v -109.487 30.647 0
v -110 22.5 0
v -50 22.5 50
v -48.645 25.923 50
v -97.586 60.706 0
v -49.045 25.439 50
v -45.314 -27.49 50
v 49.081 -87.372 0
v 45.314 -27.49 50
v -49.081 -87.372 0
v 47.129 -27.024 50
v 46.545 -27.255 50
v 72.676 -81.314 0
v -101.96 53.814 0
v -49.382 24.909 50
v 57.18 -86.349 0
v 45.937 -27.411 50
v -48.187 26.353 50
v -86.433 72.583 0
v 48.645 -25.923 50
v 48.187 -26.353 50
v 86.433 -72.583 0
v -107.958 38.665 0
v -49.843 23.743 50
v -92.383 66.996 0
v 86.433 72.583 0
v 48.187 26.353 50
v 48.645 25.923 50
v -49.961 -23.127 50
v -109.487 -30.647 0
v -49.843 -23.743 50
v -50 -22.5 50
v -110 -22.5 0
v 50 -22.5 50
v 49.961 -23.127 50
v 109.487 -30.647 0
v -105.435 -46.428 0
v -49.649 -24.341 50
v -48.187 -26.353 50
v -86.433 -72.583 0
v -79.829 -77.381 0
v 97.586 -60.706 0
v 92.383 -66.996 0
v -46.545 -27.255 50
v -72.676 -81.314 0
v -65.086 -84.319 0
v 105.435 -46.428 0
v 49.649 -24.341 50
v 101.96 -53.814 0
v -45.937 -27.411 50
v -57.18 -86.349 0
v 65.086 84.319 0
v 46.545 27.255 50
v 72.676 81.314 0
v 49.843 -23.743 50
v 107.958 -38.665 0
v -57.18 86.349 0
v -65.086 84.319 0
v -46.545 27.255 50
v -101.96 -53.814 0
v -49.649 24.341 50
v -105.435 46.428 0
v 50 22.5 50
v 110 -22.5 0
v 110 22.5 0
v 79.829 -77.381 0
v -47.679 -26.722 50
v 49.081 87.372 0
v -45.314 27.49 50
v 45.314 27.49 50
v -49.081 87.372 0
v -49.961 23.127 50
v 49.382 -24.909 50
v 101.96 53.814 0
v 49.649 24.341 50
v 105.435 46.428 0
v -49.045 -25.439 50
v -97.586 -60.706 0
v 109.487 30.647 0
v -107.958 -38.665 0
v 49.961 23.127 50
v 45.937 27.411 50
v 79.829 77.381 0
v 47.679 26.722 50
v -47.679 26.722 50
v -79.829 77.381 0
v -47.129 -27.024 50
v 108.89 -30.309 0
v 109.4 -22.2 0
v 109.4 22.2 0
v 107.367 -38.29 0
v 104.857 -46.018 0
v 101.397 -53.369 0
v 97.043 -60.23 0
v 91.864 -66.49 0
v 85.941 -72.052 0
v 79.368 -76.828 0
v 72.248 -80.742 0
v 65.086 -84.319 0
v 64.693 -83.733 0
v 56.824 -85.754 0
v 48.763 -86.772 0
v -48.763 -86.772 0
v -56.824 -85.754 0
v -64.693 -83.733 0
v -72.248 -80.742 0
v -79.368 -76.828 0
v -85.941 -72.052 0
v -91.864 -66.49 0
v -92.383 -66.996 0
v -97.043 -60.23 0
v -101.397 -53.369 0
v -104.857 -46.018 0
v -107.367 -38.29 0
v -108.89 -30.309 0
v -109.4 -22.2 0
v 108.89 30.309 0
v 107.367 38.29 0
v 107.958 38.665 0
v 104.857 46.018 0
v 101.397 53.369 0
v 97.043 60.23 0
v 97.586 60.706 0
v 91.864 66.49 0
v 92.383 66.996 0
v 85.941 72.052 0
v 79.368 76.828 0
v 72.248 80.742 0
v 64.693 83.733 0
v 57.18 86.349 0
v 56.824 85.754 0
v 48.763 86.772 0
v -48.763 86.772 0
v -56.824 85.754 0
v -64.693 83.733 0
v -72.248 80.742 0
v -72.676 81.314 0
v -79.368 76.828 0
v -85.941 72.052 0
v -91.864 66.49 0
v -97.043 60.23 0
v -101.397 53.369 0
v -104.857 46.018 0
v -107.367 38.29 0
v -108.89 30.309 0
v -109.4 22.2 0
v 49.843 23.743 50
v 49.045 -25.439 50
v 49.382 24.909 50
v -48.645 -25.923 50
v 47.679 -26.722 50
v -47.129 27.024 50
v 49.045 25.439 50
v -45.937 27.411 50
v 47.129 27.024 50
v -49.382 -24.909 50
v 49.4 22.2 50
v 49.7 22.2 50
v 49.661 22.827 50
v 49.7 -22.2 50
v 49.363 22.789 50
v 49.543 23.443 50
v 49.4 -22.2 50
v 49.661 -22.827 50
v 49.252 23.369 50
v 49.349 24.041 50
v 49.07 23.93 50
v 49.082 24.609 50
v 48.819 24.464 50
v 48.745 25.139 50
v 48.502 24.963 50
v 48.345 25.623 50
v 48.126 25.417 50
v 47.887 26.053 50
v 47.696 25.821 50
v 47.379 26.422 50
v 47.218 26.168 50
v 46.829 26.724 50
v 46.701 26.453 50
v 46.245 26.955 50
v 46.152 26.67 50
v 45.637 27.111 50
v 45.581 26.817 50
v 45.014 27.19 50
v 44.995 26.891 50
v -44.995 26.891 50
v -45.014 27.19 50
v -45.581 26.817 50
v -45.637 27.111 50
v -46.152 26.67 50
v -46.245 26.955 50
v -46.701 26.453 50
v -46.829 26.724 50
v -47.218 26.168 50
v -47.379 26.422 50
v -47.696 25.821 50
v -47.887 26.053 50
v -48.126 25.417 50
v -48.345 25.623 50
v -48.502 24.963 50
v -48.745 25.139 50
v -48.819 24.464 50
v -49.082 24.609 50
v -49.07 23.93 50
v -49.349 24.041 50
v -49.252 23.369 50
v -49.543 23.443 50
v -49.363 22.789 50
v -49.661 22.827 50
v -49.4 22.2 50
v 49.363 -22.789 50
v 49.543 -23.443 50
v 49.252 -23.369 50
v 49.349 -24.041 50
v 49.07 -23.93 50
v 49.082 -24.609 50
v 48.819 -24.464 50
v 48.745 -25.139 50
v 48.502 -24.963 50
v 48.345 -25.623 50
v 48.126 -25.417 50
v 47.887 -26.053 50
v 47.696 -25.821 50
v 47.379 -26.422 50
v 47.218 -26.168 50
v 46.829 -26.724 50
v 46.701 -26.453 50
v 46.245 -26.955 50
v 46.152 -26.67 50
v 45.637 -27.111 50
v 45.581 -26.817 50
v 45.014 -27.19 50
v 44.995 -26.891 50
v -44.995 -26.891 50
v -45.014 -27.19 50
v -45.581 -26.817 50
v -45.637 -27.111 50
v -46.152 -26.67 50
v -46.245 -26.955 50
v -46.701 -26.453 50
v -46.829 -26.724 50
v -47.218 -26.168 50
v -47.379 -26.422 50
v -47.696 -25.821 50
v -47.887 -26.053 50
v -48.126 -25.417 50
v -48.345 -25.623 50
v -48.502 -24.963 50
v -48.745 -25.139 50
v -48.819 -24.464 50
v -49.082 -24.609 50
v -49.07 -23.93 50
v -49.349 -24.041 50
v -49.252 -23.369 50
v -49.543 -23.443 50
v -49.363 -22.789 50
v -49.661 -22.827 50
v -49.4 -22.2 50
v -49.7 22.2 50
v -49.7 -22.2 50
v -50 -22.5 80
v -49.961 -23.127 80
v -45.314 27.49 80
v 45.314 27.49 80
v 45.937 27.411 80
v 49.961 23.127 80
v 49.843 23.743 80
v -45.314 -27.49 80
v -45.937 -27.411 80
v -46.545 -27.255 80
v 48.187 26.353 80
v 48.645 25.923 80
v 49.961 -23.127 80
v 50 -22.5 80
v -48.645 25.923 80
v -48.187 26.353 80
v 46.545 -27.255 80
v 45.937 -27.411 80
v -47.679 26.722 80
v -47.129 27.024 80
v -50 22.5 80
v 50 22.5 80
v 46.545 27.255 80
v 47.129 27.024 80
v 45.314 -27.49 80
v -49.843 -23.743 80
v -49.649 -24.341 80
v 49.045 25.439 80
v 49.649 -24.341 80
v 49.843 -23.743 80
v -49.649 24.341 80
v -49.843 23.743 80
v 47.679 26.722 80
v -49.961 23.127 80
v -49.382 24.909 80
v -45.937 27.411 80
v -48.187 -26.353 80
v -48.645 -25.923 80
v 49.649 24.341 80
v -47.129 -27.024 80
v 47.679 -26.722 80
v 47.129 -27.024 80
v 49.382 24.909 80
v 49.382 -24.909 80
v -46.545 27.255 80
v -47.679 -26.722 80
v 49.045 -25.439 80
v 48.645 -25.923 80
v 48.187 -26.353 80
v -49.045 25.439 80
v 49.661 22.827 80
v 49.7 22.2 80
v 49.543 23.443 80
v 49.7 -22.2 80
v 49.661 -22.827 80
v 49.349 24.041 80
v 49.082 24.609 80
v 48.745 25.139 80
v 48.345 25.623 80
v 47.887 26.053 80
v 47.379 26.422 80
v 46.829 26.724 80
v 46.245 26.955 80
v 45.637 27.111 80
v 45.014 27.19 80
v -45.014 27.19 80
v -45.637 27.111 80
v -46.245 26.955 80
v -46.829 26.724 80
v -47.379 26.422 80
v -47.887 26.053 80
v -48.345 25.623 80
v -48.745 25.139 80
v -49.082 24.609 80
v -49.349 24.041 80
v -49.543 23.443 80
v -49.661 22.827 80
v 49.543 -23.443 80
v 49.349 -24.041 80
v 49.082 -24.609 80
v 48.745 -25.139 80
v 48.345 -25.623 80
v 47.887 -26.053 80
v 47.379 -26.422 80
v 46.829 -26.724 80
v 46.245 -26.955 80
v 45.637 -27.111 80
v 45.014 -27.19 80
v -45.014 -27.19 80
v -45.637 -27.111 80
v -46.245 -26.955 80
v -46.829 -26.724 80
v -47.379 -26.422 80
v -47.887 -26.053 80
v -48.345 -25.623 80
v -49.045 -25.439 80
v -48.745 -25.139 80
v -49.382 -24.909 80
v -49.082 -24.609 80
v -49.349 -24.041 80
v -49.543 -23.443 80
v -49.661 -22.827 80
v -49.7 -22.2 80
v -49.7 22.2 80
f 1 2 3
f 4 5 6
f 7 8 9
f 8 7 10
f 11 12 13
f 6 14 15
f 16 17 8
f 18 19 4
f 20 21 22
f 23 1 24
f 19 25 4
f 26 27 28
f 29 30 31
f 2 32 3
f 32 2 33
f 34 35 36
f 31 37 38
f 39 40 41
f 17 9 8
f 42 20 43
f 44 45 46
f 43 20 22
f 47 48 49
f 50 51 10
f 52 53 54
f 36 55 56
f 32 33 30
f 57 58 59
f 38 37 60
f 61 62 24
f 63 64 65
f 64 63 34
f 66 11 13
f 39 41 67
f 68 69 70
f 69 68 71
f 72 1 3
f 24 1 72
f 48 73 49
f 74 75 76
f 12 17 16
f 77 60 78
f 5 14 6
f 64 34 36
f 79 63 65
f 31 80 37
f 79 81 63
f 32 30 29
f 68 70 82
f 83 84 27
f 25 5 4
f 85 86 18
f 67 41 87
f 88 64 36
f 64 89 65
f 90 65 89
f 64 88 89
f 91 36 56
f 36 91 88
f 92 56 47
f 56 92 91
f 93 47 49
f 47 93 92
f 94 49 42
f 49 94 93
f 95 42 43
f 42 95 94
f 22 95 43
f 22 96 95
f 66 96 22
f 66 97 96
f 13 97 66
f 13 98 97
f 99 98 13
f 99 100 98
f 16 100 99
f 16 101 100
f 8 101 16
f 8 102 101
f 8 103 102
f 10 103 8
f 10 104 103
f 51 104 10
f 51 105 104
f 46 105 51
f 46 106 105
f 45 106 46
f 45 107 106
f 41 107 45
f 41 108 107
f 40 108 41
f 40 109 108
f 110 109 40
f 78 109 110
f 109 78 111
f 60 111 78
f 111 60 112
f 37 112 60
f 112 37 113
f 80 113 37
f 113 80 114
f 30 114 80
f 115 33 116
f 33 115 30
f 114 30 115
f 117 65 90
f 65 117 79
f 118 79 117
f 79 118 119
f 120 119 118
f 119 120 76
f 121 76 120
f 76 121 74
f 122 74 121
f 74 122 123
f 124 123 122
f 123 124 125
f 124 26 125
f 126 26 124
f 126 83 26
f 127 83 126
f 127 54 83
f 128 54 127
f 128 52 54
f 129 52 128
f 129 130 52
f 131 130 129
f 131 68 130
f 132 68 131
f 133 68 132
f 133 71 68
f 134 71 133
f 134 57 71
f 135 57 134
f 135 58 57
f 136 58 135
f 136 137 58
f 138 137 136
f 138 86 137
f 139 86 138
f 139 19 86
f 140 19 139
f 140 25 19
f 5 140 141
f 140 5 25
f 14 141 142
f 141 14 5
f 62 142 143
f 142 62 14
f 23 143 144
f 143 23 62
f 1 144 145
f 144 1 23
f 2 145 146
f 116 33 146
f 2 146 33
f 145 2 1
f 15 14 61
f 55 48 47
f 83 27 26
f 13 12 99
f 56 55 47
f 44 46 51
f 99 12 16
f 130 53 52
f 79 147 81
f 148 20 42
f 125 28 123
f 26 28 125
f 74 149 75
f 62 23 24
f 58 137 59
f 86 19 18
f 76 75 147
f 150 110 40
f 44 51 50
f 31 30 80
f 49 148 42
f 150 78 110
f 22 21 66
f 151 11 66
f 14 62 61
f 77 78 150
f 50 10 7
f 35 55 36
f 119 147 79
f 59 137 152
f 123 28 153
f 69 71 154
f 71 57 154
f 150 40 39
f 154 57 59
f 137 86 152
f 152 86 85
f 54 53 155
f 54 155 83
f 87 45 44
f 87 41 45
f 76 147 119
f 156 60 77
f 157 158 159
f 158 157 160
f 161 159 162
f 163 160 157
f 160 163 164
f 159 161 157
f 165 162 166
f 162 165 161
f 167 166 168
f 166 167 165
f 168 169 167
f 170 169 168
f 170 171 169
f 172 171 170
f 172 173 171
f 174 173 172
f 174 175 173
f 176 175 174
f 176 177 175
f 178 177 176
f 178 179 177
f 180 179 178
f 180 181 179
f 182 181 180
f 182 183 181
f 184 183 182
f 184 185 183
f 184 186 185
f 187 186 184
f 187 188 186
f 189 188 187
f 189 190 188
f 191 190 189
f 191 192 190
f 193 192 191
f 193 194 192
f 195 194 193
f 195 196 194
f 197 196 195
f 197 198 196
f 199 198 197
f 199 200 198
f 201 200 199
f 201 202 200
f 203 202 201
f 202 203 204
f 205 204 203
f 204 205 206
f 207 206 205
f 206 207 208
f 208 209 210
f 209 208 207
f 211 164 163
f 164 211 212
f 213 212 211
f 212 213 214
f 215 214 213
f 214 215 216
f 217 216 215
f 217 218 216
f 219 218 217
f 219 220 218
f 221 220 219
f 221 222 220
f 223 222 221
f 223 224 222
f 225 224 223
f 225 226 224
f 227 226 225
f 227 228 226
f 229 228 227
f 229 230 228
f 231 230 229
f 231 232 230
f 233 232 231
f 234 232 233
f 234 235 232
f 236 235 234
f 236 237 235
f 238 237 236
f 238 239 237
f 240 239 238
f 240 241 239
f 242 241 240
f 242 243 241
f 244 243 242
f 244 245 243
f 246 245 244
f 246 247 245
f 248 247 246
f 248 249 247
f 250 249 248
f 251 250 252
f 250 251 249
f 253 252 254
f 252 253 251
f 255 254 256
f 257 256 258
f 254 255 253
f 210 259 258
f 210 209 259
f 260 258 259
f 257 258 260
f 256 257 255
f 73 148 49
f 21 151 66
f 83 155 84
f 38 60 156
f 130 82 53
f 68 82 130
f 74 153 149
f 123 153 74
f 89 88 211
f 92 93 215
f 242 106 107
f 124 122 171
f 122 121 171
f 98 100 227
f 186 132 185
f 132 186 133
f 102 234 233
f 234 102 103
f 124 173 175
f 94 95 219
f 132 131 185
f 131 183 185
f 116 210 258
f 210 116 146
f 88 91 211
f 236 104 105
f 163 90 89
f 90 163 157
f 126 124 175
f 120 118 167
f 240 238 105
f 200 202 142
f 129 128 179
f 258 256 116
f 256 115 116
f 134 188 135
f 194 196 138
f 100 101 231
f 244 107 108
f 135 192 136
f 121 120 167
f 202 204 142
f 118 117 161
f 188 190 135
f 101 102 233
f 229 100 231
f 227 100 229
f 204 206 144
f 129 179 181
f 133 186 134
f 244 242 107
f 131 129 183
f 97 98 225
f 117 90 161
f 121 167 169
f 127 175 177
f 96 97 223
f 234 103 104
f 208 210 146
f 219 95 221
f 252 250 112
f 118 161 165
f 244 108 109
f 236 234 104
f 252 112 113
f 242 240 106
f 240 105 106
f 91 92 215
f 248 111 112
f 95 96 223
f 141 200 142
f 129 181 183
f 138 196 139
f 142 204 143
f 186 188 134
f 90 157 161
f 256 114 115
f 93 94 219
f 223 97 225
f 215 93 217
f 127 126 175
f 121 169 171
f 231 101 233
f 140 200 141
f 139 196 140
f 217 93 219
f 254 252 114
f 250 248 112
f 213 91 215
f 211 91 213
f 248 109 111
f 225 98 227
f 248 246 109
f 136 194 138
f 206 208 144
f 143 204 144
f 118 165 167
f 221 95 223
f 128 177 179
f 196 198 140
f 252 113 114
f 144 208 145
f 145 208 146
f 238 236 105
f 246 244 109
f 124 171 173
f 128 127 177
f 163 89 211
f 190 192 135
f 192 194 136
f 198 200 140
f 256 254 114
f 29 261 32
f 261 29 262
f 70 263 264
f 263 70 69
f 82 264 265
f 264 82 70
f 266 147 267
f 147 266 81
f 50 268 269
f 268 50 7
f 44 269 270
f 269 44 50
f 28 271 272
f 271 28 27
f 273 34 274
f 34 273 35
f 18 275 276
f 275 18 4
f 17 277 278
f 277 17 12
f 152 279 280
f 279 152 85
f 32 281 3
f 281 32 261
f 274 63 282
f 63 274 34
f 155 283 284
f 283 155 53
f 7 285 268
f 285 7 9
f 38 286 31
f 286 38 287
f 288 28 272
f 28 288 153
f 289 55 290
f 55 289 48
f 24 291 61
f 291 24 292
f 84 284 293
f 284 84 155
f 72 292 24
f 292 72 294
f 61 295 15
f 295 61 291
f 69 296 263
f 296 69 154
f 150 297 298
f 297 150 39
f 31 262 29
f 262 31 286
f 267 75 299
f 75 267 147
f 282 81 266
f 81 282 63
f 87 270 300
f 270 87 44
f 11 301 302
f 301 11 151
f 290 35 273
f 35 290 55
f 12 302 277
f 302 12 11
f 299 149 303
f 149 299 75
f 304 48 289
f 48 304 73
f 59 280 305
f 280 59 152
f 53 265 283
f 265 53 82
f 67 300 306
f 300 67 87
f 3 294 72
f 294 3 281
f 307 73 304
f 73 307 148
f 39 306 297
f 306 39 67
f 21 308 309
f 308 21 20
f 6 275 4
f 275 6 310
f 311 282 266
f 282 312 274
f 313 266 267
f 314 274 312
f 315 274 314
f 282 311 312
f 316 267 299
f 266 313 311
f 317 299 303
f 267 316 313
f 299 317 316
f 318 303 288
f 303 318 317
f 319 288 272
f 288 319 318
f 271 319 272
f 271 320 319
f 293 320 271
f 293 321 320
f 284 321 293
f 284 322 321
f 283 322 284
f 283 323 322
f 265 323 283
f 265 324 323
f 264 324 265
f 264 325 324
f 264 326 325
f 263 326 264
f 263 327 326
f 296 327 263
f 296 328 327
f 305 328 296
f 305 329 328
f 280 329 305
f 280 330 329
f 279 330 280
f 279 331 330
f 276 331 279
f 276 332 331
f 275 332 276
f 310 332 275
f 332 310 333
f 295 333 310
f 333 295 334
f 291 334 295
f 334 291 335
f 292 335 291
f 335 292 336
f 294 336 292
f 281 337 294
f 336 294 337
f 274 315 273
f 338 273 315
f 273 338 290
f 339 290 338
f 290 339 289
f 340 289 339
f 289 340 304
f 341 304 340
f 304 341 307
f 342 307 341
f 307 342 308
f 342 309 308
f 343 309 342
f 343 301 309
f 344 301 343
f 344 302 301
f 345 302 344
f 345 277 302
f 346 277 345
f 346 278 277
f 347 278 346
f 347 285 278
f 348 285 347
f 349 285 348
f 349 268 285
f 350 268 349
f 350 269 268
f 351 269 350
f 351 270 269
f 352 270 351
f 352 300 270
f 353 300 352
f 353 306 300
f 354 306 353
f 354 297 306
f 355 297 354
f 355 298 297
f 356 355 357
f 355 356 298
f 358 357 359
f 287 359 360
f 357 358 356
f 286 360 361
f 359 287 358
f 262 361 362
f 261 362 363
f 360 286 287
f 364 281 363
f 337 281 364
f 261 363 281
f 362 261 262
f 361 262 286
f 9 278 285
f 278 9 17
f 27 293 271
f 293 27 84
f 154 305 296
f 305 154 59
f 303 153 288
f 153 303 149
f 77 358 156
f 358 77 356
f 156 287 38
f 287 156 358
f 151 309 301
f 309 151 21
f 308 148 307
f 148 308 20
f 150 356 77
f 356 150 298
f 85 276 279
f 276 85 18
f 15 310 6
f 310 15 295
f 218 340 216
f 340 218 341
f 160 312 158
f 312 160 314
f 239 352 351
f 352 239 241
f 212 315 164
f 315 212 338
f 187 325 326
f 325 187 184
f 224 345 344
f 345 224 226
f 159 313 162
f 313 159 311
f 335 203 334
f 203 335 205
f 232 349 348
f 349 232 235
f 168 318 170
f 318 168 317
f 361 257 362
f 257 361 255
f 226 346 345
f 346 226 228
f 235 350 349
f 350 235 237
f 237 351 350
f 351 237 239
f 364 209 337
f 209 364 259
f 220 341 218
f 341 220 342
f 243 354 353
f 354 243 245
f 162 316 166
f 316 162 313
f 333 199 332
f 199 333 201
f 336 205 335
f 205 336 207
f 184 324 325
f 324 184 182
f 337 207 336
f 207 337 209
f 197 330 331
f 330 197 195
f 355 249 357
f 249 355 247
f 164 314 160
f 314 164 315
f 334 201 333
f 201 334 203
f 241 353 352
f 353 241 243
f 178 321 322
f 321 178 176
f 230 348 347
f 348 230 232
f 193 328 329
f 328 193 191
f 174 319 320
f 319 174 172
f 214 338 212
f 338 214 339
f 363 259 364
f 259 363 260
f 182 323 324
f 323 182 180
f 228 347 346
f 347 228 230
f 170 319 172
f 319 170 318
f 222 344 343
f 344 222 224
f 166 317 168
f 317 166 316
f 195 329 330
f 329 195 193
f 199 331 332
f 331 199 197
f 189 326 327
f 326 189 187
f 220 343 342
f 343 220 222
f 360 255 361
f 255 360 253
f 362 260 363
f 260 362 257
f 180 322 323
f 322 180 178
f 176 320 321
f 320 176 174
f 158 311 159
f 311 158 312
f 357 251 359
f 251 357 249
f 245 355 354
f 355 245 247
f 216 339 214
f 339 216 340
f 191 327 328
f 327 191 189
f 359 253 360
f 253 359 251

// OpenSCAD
$fn = 50;


difference() {
	union() {
		translate(v = [0, 0, 0]) {
			rotate(a = [0, 0, 0]) {
				difference() {
					union() {
						hull() {
							translate(v = [-45.0000000000, 22.5000000000, 0]) {
								cylinder(h = 50, r = 5, r1 = 65.0000000000, r2 = 5);
							}
							translate(v = [45.0000000000, 22.5000000000, 0]) {
								cylinder(h = 50, r = 5, r1 = 65.0000000000, r2 = 5);
							}
							translate(v = [-45.0000000000, -22.5000000000, 0]) {
								cylinder(h = 50, r = 5, r1 = 65.0000000000, r2 = 5);
							}
							translate(v = [45.0000000000, -22.5000000000, 0]) {
								cylinder(h = 50, r = 5, r1 = 65.0000000000, r2 = 5);
							}
						}
					}
					union() {
						hull() {
							translate(v = [-44.7000000000, 22.2000000000, 0]) {
								cylinder(h = 50, r = 5, r1 = 64.7000000000, r2 = 4.7000000000);
							}
							translate(v = [44.7000000000, 22.2000000000, 0]) {
								cylinder(h = 50, r = 5, r1 = 64.7000000000, r2 = 4.7000000000);
							}
							translate(v = [-44.7000000000, -22.2000000000, 0]) {
								cylinder(h = 50, r = 5, r1 = 64.7000000000, r2 = 4.7000000000);
							}
							translate(v = [44.7000000000, -22.2000000000, 0]) {
								cylinder(h = 50, r = 5, r1 = 64.7000000000, r2 = 4.7000000000);
							}
						}
					}
				}
			}
		}
		translate(v = [0, 0, 50]) {
			rotate(a = [0, 0, 0]) {
				difference() {
					union() {
						hull() {
							translate(v = [-45.0000000000, 22.5000000000, 0]) {
								cylinder(h = 30, r = 5);
							}
							translate(v = [45.0000000000, 22.5000000000, 0]) {
								cylinder(h = 30, r = 5);
							}
							translate(v = [-45.0000000000, -22.5000000000, 0]) {
								cylinder(h = 30, r = 5);
							}
							translate(v = [45.0000000000, -22.5000000000, 0]) {
								cylinder(h = 30, r = 5);
							}
						}
					}
					union() {
						hull() {
							translate(v = [-44.7000000000, 22.2000000000, 0]) {
								cylinder(h = 30, r = 5);
							}
							translate(v = [44.7000000000, 22.2000000000, 0]) {
								cylinder(h = 30, r = 5);
							}
							translate(v = [-44.7000000000, -22.2000000000, 0]) {
								cylinder(h = 30, r = 5);
							}
							translate(v = [44.7000000000, -22.2000000000, 0]) {
								cylinder(h = 30, r = 5);
							}
						}
					}
				}
			}
		}
	}
	union();
}
